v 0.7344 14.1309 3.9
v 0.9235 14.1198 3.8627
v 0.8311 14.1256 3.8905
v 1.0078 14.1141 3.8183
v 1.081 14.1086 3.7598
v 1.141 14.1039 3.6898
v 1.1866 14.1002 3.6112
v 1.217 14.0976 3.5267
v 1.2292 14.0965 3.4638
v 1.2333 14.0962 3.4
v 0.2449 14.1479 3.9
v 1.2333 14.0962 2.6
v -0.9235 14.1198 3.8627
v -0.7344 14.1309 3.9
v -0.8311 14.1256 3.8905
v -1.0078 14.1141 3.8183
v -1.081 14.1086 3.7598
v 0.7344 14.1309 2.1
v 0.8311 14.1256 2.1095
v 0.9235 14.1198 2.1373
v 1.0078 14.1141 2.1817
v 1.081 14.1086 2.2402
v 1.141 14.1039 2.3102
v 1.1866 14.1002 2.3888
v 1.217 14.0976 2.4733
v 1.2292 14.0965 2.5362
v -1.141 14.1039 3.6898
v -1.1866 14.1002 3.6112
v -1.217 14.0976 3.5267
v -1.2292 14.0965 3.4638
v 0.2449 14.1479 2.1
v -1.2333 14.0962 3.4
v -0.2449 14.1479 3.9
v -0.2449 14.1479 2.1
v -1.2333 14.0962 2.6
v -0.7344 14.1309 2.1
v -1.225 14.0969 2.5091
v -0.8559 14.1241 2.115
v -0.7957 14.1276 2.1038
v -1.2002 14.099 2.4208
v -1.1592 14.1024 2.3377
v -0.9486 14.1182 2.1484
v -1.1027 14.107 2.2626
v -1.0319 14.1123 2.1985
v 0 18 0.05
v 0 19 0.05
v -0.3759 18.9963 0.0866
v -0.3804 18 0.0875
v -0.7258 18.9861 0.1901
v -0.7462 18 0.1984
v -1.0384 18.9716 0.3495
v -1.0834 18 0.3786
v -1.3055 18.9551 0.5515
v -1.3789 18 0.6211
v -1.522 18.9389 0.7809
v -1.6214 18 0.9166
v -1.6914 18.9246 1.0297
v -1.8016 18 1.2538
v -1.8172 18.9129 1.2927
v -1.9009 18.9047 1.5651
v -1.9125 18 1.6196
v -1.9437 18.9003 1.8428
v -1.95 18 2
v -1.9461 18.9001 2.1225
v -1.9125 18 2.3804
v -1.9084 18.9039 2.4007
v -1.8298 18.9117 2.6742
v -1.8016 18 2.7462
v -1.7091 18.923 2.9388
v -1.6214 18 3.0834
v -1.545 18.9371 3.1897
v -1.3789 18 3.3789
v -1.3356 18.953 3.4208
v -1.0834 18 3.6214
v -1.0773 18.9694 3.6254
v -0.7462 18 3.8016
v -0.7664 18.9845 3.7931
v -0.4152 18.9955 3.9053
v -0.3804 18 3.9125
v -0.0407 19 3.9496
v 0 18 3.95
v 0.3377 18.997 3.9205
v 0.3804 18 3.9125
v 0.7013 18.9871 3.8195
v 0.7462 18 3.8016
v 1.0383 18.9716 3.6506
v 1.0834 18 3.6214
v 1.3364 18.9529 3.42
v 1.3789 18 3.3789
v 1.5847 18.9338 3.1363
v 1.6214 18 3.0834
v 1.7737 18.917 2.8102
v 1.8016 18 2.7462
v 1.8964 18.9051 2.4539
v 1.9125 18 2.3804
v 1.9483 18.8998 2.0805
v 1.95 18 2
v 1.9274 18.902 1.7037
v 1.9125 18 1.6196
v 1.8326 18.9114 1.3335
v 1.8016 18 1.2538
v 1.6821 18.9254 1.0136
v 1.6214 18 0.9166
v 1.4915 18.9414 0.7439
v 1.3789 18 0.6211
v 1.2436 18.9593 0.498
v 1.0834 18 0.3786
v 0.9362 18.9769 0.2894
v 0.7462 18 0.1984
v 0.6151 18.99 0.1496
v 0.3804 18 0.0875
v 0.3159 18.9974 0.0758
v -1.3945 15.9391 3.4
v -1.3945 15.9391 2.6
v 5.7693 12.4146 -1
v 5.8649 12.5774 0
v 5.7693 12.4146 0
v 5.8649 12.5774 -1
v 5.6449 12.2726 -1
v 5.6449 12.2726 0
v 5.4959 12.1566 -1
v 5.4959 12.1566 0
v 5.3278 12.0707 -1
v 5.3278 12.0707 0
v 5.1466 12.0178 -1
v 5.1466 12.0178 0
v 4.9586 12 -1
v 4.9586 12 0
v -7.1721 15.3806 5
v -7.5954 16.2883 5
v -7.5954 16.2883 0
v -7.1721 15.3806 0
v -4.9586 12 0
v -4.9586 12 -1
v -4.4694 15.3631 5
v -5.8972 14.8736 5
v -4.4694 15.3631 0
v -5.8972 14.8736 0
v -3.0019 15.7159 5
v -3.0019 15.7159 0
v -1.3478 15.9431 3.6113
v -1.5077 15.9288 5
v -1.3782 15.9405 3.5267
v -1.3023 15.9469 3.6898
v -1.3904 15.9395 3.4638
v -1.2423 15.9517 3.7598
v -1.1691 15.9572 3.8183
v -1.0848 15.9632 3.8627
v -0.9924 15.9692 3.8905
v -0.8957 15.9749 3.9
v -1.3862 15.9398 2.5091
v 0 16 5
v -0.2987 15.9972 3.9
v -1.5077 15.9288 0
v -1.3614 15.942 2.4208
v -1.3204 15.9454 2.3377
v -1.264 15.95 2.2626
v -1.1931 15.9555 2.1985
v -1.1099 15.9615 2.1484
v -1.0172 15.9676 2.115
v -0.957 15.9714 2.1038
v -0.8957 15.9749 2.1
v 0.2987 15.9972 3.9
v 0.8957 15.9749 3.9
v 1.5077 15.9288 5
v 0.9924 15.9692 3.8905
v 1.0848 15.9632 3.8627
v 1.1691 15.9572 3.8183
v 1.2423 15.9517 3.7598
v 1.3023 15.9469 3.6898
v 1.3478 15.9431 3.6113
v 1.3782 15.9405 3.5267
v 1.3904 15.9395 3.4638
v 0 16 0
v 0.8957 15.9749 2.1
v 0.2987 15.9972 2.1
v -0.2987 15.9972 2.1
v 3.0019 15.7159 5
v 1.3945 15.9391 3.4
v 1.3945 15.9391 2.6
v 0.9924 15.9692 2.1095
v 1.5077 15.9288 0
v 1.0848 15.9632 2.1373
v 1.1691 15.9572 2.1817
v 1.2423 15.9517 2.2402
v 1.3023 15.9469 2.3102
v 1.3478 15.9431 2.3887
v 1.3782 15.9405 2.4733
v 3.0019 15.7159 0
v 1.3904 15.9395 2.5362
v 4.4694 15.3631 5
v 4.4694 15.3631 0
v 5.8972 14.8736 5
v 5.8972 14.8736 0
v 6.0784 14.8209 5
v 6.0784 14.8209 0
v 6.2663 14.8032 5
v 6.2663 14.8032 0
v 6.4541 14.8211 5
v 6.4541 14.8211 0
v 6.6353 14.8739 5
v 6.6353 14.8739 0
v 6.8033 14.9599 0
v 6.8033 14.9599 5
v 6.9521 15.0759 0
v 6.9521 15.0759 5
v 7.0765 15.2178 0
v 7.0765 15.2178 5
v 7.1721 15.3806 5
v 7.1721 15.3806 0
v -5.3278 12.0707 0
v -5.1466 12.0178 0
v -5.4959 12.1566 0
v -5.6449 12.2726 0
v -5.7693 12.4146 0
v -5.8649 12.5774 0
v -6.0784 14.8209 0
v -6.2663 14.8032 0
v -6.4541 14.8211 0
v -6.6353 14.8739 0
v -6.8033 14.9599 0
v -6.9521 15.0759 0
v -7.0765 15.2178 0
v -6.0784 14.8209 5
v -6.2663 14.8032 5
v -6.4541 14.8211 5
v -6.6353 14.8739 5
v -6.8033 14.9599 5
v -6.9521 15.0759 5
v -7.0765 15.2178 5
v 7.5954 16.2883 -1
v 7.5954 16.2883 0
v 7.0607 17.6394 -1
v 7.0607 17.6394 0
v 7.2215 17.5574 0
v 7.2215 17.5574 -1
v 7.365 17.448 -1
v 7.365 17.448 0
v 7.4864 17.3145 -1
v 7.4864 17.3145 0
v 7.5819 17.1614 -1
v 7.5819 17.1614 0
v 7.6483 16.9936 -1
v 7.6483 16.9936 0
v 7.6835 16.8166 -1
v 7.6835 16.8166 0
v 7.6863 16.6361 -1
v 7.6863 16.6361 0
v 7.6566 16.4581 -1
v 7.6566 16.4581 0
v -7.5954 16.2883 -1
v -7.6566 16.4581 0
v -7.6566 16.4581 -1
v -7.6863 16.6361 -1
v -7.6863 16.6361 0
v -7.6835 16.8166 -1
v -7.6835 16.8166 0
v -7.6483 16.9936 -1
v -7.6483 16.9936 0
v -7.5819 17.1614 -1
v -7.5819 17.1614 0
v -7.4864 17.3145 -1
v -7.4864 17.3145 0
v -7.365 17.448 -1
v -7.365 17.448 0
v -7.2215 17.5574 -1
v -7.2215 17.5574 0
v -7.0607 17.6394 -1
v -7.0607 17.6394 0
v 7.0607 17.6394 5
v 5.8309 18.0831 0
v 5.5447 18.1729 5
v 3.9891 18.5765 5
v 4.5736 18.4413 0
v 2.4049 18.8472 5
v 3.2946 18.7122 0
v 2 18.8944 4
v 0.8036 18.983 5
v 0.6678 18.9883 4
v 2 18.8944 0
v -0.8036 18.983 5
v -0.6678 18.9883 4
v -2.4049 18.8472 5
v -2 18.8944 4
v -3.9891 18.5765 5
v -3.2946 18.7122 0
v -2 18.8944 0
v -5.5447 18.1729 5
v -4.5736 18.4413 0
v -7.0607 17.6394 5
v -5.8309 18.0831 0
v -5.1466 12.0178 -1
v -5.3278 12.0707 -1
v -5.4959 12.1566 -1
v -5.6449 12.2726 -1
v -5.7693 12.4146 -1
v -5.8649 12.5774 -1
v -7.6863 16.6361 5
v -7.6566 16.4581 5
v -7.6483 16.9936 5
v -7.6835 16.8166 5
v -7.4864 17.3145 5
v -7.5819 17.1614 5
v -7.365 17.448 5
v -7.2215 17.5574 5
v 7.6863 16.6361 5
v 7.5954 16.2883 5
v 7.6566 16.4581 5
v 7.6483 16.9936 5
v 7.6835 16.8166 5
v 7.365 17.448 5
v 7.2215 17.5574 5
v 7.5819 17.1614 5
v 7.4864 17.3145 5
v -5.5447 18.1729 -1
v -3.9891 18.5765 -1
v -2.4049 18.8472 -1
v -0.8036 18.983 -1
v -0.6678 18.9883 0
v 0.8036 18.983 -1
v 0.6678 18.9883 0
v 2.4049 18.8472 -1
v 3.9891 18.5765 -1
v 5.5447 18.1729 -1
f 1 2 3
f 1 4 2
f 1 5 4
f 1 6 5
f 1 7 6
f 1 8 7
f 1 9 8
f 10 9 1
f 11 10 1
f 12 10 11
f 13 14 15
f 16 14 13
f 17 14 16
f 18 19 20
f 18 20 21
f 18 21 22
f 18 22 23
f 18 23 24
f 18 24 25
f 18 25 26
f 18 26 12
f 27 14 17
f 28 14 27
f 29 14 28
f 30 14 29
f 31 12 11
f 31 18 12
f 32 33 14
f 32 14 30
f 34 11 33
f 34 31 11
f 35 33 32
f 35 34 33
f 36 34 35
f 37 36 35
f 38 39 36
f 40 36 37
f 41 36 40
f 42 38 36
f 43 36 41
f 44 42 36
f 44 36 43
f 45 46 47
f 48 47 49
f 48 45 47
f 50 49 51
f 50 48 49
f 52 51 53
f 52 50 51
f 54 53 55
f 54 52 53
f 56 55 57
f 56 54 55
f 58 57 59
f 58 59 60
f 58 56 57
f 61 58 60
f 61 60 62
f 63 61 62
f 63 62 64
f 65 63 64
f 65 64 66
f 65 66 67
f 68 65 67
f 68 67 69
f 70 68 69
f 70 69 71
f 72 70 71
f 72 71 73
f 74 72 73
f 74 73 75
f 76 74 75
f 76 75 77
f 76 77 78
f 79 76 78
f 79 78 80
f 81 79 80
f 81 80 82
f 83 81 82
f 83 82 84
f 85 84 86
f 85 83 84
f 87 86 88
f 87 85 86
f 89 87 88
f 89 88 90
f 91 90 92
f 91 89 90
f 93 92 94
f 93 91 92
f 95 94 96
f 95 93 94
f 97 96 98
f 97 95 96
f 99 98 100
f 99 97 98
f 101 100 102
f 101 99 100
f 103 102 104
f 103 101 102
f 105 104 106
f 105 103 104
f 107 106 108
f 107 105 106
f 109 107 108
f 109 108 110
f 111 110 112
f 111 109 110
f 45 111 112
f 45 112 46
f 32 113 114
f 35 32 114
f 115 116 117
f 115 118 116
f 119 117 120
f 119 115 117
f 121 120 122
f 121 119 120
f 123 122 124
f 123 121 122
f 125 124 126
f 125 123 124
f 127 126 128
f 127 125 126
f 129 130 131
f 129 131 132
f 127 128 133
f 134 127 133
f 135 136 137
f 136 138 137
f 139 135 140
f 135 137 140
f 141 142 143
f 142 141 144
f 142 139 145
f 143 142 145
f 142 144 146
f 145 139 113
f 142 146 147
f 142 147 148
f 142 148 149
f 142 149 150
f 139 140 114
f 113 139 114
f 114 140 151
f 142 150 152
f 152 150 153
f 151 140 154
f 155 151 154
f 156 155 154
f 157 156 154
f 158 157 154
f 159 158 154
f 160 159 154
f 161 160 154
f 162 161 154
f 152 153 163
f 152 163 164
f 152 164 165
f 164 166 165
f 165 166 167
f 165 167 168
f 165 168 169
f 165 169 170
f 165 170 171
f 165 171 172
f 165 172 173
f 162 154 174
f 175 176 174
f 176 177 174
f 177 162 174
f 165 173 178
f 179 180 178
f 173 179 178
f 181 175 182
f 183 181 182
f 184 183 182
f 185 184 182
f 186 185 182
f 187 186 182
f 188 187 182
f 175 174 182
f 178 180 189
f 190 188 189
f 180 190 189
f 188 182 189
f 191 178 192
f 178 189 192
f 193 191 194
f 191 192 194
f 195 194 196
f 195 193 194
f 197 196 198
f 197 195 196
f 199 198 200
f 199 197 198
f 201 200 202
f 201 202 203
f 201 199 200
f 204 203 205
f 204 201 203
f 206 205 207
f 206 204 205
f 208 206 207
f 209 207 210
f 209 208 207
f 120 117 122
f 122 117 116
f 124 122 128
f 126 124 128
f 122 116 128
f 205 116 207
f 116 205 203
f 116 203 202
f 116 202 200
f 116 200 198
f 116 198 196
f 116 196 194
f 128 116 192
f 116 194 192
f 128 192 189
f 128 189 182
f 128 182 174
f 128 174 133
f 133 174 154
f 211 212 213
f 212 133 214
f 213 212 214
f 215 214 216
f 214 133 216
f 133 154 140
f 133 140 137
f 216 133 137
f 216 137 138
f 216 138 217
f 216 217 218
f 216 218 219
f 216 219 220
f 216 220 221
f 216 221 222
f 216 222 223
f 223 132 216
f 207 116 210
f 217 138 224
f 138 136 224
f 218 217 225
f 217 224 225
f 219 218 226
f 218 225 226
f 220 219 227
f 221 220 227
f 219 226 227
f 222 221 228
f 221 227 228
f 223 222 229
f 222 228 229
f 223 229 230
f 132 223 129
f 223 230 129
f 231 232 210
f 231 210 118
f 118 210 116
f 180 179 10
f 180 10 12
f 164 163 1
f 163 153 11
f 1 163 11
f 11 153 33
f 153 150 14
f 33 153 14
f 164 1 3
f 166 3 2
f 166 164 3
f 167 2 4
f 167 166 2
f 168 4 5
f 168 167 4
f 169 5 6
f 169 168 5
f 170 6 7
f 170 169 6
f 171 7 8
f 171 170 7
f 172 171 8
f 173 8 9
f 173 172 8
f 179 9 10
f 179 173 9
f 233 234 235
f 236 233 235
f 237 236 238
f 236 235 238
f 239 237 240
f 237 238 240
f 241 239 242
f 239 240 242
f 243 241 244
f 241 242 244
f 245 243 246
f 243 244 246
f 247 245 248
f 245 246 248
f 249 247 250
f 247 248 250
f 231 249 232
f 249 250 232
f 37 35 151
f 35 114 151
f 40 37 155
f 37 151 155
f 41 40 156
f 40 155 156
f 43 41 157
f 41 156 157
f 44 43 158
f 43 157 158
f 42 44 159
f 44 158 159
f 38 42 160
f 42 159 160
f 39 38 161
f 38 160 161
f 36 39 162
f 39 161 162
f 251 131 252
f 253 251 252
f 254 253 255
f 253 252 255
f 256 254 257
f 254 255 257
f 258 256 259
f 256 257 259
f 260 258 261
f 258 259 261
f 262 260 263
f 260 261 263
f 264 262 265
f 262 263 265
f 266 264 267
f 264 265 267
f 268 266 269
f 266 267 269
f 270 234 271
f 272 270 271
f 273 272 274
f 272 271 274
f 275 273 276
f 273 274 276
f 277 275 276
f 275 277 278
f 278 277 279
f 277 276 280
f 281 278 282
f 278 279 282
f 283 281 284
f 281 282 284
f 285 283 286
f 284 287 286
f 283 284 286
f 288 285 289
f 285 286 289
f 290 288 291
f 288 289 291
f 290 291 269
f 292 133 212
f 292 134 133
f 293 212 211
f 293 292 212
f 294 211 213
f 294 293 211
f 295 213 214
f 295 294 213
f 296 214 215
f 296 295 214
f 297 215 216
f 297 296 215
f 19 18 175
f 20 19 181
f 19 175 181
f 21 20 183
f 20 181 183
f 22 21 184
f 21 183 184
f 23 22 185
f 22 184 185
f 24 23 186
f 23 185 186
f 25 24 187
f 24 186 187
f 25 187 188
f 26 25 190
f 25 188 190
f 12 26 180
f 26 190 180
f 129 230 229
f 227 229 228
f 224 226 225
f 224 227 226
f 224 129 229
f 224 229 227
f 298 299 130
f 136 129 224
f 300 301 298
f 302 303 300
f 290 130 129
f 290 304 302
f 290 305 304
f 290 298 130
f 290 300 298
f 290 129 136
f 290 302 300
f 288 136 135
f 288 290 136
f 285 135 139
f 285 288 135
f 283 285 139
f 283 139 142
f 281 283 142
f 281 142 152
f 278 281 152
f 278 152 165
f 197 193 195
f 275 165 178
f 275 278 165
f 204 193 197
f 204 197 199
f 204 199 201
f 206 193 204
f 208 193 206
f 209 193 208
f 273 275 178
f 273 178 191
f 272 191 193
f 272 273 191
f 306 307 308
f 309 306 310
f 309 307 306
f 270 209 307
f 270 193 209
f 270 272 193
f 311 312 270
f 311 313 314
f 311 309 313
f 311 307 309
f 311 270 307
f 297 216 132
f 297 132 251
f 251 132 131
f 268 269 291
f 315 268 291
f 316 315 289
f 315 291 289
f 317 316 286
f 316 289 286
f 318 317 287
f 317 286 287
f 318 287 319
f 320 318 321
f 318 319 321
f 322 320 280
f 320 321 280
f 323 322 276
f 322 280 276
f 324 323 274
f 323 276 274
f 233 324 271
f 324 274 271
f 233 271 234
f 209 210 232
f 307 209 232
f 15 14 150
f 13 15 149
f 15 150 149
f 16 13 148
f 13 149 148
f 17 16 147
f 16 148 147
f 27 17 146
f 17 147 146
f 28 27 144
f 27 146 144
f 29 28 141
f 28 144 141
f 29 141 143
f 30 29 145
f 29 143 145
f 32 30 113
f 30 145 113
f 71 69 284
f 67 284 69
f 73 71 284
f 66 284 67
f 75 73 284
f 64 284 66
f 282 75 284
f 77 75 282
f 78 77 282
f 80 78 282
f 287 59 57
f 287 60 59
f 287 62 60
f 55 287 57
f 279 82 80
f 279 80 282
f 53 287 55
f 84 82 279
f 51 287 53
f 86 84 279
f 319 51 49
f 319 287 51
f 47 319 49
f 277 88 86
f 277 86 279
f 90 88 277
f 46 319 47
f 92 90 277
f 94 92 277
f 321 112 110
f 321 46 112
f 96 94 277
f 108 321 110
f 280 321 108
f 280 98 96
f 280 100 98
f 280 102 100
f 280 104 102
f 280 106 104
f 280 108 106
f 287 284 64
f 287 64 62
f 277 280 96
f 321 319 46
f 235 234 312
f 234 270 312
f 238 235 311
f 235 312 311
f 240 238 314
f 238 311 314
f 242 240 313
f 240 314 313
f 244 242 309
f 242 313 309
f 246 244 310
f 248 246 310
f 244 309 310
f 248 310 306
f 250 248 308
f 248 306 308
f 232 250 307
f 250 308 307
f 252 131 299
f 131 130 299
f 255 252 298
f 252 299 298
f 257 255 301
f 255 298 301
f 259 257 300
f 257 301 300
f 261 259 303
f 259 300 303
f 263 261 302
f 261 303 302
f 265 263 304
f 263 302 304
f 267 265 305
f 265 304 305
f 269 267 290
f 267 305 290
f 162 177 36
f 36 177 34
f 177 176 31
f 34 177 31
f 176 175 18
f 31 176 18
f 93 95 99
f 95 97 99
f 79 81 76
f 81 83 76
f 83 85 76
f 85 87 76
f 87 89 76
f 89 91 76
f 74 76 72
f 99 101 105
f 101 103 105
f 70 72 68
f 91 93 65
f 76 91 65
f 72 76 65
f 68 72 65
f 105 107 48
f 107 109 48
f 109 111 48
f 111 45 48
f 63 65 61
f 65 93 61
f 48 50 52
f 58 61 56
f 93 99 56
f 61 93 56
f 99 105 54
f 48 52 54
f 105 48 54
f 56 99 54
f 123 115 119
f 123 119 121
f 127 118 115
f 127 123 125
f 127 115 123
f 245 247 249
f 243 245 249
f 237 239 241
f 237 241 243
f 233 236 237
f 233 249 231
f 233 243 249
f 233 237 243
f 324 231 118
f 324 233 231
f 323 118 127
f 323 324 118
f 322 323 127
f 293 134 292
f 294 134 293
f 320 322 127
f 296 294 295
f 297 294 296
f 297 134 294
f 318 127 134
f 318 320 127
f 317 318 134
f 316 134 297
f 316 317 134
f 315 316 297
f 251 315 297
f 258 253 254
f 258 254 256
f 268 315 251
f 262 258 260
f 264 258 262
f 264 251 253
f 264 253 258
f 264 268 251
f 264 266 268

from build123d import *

# Parameters (mm, degrees)
EXTRUDE_1_DEPTH      = 5
SKETCH_2_W           = 1.8
SKETCH_2_H           = 3.7
REVOLVE_1_ANGLE      = 5
FILLET_1_R           = 0.5
FILLET_2_R           = 1
FILLET_3_R           = 1
SKETCH_4_W           = 4
SKETCH_4_H           = 2
CUT_EXTRUDE_1_DEPTH  = 4
EXTRUDE_5_REACH      = 11.968
EXTRUDE_5_END_RADIUS = 19
SKETCH_5_W           = 4
SKETCH_5_H           = 4
SKETCH_5_R           = 1.95
EXTRUDE_6_DEPTH      = 1
FILLET_5_R           = 1


with BuildPart() as part:
    # 草图1 → 凸台-拉伸1 (new body)
    with BuildSketch(Plane.XY):
        with BuildLine():
            Line((-8.029746973, 17.219847954), (-6.761892188, 14.500924593))
            ThreePointArc((-6.761892188, 14.500924593), (0, 16), (6.761892188, 14.500924593))
            Line((6.761892188, 14.500924593), (8.029746973, 17.219847954))
            ThreePointArc((8.029746973, 17.219847954), (0, 19), (-8.029746973, 17.219847954))
        make_face()
    extrude(amount=EXTRUDE_1_DEPTH)

    # 草图2 → 旋转1 (revolve)
    with BuildSketch(Plane(origin=(0, 0, 0), x_dir=(0, 0, -1), z_dir=(1, 0, 0))):
        with Locations((-3, 16)):
            Rectangle(SKETCH_2_W, SKETCH_2_H)
    revolve_1 = revolve(axis=Axis((0, 0, 5), (0, 0, -1)), revolution_arc=REVOLVE_1_ANGLE)

    # 镜向1: 旋转1 across plane
    add(revolve_1.mirror(Plane(origin=(0, 0, 0), x_dir=(0, 0, 1), z_dir=(1, 0, 0))))

    # 圆角1
    fillet_1_edges = [part.edges().sort_by_distance(p)[0] for p in [
        (1.313872822, 15.017635074, 3.9),
        (1.313872822, 15.017635074, 2.1),
        (-1.313872822, 15.017635074, 2.1),
        (-1.313872822, 15.017635074, 3.9),
    ]]
    fillet(fillet_1_edges, radius=FILLET_1_R)

    # 圆角2
    fillet_2_edges = [part.edges().sort_by_distance(p)[0] for p in [
        (-6.761892188, 14.500924593, 2.5),
        (6.761892188, 14.500924593, 2.5),
    ]]
    fillet(fillet_2_edges, radius=FILLET_2_R)

    # 圆角3
    fillet_3_edges = [part.edges().sort_by_distance(p)[0] for p in [
        (-8.029746973, 17.219847954, 2.5),
        (8.029746973, 17.219847954, 2.5),
    ]]
    fillet(fillet_3_edges, radius=FILLET_3_R)

    # 草图4 → 切除-拉伸1 (cut)
    with BuildSketch(Plane(origin=(0, 0, 0), x_dir=(-1, 0, 0), z_dir=(0, 0, -1))):
        with Locations((0, 19)):
            Rectangle(SKETCH_4_W, SKETCH_4_H)
    extrude(amount=-CUT_EXTRUDE_1_DEPTH, mode=Mode.SUBTRACT)

    # 凸台-拉伸5: up to this cylinder (the profile starts inside it)
    extrude_5_end = Plane(origin=(0, 0, 3.994343), z_dir=(0, 0, -1)) * Cylinder(EXTRUDE_5_END_RADIUS, 62.936, mode=Mode.PRIVATE)
    # 草图5 → 凸台-拉伸5 (add, up to the surface)
    with BuildSketch(Plane(origin=(0, 18, 0), x_dir=(1, 0, 0), z_dir=(0, 1, 0)), mode=Mode.PRIVATE) as extrude_5_sk1:
        with Locations((0, -2)):
            Rectangle(SKETCH_5_W, SKETCH_5_H)
        with Locations(Location((0, -2, 0), (0, 0, 90))):
            Circle(SKETCH_5_R, mode=Mode.SUBTRACT)
    extrude_5_tool1 = extrude(extrude_5_sk1.sketch, amount=EXTRUDE_5_REACH, mode=Mode.PRIVATE) & extrude_5_end
    add(extrude_5_tool1.solids().sort_by_distance((0, 18, 3.994343))[0])

    # 草图6 → 凸台-拉伸6 (add)
    with BuildSketch(Plane(origin=(0, 0, 0), x_dir=(-1, 0, 0), z_dir=(0, 0, -1))):
        with BuildLine():
            Line((-7.595380243, 16.288345495), (-5.595691898, 12))
            Line((-5.595691898, 12), (5.595691898, 12))
            Line((5.595691898, 12), (7.595380243, 16.288345495))
            ThreePointArc((7.595380243, 16.288345495), (7.618897961, 17.078964477), (7.060687592, 17.639350632))
            ThreePointArc((7.060687592, 17.639350632), (0, 19), (-7.060687592, 17.639350632))
            ThreePointArc((-7.060687592, 17.639350632), (-7.618897961, 17.078964477), (-7.595380243, 16.288345495))
        make_face()
    extrude(amount=EXTRUDE_6_DEPTH)

    # 圆角5
    fillet_5_edges = [part.edges().sort_by_distance(p)[0] for p in [
        (5.595691898, 12, -0.5),
        (-5.595691898, 12, -0.5),
    ]]
    fillet(fillet_5_edges, radius=FILLET_5_R)


solid = part.part
